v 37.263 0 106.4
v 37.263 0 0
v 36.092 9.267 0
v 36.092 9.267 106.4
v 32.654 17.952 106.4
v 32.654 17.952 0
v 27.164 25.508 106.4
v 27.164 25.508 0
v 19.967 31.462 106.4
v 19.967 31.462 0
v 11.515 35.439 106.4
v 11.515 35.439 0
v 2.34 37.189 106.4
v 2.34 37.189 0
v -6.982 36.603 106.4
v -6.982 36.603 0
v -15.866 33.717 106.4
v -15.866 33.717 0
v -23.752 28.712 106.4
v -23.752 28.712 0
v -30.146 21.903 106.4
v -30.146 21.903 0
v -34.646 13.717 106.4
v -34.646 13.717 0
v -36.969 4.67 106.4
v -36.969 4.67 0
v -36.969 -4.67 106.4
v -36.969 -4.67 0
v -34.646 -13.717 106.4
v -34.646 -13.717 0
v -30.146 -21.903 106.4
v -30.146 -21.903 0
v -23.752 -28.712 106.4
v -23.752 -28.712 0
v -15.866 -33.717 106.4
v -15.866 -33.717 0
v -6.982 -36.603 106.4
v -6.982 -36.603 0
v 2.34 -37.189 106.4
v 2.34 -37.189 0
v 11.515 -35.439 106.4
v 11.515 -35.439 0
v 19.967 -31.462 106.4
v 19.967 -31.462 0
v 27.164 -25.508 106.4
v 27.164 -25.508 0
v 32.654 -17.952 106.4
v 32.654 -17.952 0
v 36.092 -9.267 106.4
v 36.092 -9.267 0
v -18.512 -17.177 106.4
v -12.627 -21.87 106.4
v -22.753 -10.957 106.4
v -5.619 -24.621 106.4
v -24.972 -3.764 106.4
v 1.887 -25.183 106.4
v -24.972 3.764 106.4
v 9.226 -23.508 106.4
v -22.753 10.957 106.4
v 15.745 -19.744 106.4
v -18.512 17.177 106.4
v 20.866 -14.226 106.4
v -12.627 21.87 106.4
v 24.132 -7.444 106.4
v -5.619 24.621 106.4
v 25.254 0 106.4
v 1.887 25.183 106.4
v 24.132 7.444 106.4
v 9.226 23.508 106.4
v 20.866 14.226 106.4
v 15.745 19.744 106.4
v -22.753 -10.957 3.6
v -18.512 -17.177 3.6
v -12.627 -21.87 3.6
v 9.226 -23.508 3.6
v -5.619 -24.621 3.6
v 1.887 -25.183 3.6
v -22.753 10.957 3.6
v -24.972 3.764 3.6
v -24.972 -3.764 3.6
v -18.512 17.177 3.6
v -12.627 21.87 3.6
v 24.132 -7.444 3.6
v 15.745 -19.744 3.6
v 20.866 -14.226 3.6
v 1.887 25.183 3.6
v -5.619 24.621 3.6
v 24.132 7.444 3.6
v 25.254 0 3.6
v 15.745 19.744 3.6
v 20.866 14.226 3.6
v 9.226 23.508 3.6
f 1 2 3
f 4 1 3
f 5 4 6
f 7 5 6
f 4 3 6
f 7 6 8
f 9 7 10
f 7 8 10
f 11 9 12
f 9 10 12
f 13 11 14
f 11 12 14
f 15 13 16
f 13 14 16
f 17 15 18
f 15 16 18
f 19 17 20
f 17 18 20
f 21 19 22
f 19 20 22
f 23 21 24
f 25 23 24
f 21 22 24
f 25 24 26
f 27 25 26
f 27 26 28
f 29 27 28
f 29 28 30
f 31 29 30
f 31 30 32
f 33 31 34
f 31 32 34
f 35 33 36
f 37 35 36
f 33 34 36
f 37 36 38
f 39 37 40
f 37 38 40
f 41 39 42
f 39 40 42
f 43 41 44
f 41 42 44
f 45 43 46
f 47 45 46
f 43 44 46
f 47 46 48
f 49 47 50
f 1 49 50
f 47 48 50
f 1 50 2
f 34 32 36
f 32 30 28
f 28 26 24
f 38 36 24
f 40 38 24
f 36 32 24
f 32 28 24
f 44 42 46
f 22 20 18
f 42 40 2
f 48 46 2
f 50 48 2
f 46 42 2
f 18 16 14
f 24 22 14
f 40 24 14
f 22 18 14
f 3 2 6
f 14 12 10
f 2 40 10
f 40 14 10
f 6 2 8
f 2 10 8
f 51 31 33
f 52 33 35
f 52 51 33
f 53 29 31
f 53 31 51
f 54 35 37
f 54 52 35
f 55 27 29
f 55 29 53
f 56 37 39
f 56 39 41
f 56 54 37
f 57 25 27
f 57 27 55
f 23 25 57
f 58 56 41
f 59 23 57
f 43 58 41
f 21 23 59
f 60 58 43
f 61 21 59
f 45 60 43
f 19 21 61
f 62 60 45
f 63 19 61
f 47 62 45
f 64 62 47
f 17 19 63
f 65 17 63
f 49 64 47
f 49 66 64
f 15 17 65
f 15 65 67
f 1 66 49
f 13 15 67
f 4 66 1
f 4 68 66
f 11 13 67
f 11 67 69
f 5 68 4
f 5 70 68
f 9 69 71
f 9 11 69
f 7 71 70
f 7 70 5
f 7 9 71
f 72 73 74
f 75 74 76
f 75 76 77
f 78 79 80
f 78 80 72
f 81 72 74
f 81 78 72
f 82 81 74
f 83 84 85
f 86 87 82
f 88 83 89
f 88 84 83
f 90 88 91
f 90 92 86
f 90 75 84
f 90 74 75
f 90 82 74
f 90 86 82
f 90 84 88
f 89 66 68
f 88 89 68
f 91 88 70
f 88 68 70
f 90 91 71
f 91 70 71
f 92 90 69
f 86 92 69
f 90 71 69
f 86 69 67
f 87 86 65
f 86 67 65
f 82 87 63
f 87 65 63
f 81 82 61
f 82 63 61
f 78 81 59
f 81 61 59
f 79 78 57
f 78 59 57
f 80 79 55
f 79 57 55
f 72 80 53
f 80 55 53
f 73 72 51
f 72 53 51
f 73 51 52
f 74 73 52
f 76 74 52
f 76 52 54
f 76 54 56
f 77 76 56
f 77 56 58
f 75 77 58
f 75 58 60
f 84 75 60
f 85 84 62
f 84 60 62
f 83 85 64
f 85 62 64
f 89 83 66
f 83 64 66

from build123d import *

# Parameters (mm, degrees)
F0_R     = 37.2630205799
F1_DEPTH = 106.4
F3_DEPTH = 86.5
F5_R     = 25.2537141006
F6_DEPTH = 102.8


# Not quite as in the source:
# - a feature names something its author has since deleted; it is built from what else it names


with BuildPart() as f1:
    # F0 (on Top) → F1 (new body)
    with BuildSketch(Plane.XY):
        Circle(F0_R)
    extrude(amount=F1_DEPTH)

    # F2 (on face) → F3 (join)
    with BuildSketch(Plane.XY.offset(106.4)):
        Polygon((4.5720788687, -32.5187220476), (30.4480788261, -12.2998245754), (25.8759999575, 20.2188974722), (-4.5720788687, 32.5187220476), (-30.4480788261, 12.2998245754), (-25.8759999575, -20.2188974722), align=None)
    extrude(amount=-F3_DEPTH)

    # F5 (on face) → F6 (cut)
    with BuildSketch(Plane.XY.offset(106.4)):
        Circle(F5_R)
    extrude(amount=-F6_DEPTH, mode=Mode.SUBTRACT)


solid = f1.part
